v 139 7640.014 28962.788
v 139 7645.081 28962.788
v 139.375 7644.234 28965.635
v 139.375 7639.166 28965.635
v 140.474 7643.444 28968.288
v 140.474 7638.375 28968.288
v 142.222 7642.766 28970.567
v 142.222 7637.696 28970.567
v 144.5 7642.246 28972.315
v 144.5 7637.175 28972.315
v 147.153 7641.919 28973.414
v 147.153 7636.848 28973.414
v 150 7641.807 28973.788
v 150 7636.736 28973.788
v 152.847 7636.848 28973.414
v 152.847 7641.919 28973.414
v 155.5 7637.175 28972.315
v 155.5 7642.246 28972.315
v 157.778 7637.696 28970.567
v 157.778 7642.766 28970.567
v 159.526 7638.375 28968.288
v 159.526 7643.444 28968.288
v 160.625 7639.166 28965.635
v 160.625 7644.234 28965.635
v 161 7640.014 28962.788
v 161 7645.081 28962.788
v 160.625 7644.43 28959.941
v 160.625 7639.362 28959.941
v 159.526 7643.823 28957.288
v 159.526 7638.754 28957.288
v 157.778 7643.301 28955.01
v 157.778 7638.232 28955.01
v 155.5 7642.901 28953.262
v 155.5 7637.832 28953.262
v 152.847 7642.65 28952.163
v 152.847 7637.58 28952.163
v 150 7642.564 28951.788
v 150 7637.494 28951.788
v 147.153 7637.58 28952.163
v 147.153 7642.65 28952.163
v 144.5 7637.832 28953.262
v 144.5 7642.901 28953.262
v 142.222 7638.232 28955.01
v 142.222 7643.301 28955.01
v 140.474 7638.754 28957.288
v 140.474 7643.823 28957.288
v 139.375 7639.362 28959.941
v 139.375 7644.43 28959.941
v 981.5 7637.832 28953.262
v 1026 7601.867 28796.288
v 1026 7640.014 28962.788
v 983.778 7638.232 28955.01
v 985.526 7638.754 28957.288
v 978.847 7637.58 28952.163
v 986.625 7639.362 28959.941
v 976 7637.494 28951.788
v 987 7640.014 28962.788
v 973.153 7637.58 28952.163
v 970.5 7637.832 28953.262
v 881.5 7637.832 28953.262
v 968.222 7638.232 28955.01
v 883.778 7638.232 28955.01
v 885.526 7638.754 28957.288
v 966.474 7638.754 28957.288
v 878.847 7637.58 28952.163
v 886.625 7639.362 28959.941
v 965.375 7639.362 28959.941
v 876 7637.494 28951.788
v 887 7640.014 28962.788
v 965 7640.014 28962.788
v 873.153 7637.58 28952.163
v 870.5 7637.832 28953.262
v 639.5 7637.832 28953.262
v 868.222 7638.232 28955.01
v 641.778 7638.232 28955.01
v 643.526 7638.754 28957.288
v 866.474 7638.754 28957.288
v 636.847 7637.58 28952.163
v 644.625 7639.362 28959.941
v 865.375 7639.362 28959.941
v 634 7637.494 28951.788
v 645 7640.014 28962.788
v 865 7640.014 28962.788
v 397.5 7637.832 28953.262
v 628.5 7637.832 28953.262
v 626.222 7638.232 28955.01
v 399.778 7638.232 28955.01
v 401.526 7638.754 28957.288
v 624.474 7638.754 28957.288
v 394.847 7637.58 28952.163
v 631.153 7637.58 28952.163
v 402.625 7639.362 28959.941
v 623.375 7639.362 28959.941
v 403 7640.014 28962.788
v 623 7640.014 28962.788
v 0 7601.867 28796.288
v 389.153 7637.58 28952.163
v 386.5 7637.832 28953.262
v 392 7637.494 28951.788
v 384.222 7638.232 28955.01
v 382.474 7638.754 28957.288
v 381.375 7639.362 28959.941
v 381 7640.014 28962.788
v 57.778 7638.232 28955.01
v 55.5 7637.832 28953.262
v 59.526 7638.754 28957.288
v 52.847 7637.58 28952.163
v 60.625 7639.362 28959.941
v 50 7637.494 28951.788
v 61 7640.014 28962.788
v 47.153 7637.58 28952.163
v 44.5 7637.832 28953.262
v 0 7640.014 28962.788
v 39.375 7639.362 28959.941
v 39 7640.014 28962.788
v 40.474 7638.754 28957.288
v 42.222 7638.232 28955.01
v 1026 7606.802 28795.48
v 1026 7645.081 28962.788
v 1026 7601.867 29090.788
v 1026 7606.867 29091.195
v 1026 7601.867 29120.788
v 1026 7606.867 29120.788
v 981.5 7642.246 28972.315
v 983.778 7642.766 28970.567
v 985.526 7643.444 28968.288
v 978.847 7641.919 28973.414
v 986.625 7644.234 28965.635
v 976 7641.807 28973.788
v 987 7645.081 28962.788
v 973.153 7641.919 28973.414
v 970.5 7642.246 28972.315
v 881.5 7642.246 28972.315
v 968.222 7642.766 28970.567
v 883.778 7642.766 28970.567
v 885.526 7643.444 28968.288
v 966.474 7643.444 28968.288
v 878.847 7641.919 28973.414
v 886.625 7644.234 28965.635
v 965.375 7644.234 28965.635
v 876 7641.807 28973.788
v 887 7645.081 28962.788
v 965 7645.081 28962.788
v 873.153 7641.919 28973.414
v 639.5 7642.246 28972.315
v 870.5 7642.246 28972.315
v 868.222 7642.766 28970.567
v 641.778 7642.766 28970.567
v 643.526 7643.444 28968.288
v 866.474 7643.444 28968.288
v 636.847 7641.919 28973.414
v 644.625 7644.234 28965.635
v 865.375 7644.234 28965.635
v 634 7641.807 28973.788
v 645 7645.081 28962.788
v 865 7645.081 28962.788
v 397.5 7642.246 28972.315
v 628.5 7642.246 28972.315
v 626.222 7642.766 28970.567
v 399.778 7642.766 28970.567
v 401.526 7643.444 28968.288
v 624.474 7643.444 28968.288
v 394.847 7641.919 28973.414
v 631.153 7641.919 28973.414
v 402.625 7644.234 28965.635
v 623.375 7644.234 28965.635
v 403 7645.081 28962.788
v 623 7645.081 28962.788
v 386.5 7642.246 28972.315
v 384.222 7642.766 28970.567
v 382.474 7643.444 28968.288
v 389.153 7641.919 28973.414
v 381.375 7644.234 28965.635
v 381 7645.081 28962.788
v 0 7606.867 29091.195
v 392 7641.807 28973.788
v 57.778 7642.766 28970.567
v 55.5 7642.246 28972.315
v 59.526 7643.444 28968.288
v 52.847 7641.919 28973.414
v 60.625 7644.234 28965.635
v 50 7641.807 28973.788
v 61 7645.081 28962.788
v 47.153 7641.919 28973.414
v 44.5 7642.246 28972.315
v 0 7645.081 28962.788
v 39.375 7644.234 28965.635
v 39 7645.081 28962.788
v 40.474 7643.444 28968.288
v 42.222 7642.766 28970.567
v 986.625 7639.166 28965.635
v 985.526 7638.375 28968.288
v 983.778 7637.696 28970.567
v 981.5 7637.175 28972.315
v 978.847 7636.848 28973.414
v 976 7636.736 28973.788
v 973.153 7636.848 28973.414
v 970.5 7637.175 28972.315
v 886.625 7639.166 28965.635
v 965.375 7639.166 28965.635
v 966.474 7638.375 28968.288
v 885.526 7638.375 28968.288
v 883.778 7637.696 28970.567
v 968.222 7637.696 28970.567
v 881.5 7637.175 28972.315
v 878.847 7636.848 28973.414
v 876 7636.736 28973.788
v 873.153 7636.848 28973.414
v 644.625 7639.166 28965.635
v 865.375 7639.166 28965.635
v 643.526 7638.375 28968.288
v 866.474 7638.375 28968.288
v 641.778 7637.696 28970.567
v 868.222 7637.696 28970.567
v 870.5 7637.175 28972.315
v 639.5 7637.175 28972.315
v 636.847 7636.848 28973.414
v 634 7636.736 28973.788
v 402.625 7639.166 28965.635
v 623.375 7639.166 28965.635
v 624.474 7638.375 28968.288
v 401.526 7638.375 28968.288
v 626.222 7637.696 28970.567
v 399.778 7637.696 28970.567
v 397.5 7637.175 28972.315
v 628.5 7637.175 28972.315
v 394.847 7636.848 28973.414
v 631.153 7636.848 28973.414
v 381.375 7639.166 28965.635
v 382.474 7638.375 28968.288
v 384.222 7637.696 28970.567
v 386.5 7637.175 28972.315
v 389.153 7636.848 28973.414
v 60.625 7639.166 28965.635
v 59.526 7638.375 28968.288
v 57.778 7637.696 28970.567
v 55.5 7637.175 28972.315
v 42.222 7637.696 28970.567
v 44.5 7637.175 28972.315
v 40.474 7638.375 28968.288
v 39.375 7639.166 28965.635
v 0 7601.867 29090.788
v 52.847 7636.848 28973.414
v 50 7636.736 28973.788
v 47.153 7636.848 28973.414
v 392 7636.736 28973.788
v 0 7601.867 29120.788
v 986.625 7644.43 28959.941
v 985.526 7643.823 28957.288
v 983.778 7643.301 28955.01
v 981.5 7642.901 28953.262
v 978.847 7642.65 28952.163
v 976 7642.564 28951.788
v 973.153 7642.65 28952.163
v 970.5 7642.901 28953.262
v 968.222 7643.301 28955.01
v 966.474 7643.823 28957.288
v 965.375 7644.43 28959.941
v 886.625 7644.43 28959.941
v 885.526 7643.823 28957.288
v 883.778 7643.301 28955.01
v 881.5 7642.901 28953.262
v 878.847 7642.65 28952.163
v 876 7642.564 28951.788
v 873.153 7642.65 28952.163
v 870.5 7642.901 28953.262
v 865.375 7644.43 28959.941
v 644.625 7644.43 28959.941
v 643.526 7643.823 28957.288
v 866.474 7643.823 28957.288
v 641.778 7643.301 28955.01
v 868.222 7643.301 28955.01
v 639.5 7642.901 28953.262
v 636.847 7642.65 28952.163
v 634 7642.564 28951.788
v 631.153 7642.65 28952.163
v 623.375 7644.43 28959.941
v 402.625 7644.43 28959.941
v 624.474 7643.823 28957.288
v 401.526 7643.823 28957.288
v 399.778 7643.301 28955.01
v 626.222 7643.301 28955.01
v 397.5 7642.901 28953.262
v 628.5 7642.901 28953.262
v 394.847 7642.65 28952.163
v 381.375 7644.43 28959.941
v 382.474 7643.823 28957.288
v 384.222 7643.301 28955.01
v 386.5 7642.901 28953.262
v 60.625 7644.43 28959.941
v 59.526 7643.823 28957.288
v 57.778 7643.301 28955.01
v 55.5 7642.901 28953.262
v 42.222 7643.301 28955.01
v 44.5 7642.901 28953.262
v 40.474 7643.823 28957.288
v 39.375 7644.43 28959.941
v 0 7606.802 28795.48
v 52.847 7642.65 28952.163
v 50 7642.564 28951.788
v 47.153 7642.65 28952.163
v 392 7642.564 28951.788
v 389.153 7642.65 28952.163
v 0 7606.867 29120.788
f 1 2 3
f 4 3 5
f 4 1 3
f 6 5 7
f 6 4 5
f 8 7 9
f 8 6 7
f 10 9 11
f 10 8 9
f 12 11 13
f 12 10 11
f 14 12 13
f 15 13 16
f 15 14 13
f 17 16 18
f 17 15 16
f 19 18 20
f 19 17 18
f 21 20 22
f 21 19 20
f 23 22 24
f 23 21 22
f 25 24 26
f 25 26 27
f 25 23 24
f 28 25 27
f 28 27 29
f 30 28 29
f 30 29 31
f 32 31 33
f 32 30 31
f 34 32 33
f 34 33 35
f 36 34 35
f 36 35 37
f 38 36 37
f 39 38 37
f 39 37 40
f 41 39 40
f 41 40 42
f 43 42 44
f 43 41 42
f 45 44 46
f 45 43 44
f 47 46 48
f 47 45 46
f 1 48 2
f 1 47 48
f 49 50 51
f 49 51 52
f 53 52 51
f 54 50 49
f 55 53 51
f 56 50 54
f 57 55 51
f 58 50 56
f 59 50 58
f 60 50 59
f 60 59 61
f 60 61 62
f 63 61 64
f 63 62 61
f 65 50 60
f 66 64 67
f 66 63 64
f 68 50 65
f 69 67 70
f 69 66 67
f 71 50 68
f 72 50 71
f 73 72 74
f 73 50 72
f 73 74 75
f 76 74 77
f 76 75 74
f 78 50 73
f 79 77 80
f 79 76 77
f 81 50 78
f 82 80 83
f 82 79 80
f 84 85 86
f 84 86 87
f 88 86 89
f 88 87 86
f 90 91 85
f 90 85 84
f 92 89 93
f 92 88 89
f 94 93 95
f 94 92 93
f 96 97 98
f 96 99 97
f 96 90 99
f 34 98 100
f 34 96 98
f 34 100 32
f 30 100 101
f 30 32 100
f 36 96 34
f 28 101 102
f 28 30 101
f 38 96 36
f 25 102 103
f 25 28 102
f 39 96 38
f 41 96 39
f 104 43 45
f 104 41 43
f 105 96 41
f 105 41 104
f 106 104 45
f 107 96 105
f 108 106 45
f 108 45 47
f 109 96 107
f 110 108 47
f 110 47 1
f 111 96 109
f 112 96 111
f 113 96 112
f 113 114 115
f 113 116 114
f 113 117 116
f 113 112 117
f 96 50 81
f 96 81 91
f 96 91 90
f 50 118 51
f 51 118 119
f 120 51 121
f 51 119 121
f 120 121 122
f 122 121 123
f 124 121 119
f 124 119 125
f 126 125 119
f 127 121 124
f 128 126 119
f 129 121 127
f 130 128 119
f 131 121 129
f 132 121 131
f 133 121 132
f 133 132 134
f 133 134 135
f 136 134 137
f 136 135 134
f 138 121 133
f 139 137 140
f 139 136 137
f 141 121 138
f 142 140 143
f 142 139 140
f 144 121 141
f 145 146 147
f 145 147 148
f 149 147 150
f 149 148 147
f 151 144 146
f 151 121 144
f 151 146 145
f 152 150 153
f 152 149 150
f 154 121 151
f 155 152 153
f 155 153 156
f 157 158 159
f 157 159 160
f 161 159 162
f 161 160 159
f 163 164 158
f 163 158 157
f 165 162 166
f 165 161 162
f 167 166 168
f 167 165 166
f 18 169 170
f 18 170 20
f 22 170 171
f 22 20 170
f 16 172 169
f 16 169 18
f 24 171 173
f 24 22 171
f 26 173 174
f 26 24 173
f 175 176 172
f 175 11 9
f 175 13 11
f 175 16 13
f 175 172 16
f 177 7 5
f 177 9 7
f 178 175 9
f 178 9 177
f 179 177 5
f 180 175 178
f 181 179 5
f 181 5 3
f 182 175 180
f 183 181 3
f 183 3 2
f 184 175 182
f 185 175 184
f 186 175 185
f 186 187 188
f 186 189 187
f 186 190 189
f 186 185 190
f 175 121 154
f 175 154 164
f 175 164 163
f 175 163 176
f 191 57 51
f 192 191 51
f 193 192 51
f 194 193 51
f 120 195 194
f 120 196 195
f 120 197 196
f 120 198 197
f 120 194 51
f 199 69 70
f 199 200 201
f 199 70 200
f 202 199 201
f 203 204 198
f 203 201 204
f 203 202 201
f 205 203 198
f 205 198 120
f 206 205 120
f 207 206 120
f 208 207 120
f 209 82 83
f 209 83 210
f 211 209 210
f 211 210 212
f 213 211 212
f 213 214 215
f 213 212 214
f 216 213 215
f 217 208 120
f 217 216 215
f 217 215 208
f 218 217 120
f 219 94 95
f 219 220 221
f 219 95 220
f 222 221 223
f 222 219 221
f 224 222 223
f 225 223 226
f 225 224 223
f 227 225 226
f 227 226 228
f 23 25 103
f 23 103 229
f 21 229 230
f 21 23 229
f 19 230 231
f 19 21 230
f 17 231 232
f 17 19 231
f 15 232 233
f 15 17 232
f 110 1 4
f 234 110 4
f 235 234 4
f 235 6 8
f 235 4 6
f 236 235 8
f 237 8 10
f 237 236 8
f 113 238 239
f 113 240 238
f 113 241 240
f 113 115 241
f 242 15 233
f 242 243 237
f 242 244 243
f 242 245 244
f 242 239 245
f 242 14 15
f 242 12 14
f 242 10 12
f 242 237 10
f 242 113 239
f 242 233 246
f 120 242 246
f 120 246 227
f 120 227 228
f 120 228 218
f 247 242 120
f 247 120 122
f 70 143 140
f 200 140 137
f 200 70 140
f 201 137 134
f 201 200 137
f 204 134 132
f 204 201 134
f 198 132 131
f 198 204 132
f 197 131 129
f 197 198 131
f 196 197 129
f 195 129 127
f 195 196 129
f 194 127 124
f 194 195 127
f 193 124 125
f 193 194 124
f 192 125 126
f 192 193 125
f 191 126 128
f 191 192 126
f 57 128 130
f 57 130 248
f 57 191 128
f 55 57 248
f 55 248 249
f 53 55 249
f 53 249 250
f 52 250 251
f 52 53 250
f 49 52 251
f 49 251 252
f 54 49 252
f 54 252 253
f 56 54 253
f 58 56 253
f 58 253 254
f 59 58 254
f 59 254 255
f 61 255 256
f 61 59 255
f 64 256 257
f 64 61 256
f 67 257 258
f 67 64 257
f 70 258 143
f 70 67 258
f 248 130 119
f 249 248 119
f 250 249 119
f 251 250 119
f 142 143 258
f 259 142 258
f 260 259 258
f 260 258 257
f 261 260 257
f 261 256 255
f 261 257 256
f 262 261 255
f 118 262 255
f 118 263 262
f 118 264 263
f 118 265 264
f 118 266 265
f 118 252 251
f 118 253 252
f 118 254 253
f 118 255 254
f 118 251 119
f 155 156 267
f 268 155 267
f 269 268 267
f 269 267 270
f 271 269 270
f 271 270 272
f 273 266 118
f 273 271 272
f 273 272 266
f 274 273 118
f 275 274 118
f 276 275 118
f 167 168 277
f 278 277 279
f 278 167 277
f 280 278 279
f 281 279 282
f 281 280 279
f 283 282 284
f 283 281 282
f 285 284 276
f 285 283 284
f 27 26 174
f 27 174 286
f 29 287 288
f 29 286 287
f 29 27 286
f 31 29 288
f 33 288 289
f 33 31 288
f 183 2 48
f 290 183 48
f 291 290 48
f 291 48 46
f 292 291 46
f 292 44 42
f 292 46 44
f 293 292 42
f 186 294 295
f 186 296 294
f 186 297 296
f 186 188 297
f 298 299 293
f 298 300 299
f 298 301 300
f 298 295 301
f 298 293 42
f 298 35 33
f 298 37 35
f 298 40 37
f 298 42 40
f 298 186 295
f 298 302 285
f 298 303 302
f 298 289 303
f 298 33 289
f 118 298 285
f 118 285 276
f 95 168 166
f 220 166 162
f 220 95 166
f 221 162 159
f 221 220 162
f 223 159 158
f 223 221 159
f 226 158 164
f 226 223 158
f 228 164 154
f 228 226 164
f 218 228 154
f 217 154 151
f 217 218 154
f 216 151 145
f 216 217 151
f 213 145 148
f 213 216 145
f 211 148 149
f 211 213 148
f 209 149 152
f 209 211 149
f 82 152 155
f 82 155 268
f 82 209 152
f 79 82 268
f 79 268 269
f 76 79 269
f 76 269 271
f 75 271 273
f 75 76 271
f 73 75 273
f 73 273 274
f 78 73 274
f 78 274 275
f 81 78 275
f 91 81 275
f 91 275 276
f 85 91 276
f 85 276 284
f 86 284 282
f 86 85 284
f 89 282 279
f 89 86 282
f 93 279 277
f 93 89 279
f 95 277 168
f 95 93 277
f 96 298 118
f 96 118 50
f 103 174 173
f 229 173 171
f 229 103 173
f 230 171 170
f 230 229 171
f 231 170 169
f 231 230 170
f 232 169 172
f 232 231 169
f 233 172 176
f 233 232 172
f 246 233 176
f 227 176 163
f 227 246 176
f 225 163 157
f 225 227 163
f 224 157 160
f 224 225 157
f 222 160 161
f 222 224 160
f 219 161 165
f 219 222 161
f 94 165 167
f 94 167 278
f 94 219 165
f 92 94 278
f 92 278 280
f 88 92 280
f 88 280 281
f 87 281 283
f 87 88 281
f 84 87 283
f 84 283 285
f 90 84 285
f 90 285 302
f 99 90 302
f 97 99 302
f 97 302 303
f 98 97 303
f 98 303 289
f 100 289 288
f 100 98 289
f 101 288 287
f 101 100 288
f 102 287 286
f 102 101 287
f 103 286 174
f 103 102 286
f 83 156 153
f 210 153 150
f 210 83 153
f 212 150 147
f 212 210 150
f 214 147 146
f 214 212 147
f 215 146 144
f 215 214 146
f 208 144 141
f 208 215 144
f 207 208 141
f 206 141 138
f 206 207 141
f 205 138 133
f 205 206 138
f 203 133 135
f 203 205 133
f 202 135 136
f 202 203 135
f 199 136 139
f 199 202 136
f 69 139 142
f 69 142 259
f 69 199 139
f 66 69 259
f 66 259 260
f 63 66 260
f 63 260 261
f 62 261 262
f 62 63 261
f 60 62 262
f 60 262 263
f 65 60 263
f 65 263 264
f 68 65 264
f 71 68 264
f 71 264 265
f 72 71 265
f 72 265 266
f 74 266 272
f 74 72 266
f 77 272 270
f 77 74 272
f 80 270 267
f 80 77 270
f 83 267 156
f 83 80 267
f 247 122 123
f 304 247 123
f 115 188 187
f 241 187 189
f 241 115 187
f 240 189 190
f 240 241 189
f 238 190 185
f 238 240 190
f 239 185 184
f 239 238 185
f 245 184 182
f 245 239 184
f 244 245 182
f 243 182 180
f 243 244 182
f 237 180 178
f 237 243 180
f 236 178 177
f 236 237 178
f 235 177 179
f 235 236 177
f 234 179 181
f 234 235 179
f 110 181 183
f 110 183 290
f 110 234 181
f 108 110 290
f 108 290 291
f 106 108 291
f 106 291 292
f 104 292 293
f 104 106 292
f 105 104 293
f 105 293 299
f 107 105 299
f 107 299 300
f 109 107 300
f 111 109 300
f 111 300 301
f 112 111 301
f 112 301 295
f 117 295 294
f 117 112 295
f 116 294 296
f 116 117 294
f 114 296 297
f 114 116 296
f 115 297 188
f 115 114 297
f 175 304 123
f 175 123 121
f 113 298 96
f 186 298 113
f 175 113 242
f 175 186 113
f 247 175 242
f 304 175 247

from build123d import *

# Parameters (mm, degrees)
BOSS_EXTRUDE1_DEPTH     = 1026
CUT_EXTRUDE1_DEPTH      = 30126.076908122
CUT_EXTRUDE1_DEPTH_BACK = 30126.076908122
SKETCH2_R               = 11


with BuildPart() as part:
    # Sketch1 → Boss-Extrude1 (new body)
    with BuildSketch(Plane(origin=(0, 0, 0), x_dir=(0, 0, -1), z_dir=(1, 0, 0))):
        Polygon((-29120.788440545, 7606.867460507), (-29091.195271738, 7606.867460507), (-28962.788440545, 7645.080988537), (-28795.480129553, 7606.801691282), (-28796.288440545, 7601.867460507), (-28962.788440545, 7640.014342662), (-29090.788440545, 7601.867460507), (-29120.788440545, 7601.867460507), align=None)
    extrude(amount=BOSS_EXTRUDE1_DEPTH)

    # Sketch2 → Cut-Extrude1 (cut, two sides: drawn at the far end of the back side and taken through both)
    with BuildSketch(Plane(origin=(0, 0, 0), x_dir=(1, 0, 0), z_dir=(0, 1, 0)).offset(-CUT_EXTRUDE1_DEPTH_BACK)):
        with Locations(Location((50, -28962.788440545, 0), (0, 0, 180))):
            Circle(SKETCH2_R)
        with Locations(Location((150, -28962.788440545, 0), (0, 0, 180))):
            Circle(SKETCH2_R)
        with Locations(Location((392, -28962.788440545, 0), (0, 0, 180))):
            Circle(SKETCH2_R)
        with Locations(Location((634, -28962.788440545, 0), (0, 0, 180))):
            Circle(SKETCH2_R)
        with Locations(Location((876, -28962.788440545, 0), (0, 0, 180))):
            Circle(SKETCH2_R)
        with Locations(Location((976, -28962.788440545, 0), (0, 0, 180))):
            Circle(SKETCH2_R)
    extrude(amount=CUT_EXTRUDE1_DEPTH + CUT_EXTRUDE1_DEPTH_BACK, mode=Mode.SUBTRACT)


solid = part.part
